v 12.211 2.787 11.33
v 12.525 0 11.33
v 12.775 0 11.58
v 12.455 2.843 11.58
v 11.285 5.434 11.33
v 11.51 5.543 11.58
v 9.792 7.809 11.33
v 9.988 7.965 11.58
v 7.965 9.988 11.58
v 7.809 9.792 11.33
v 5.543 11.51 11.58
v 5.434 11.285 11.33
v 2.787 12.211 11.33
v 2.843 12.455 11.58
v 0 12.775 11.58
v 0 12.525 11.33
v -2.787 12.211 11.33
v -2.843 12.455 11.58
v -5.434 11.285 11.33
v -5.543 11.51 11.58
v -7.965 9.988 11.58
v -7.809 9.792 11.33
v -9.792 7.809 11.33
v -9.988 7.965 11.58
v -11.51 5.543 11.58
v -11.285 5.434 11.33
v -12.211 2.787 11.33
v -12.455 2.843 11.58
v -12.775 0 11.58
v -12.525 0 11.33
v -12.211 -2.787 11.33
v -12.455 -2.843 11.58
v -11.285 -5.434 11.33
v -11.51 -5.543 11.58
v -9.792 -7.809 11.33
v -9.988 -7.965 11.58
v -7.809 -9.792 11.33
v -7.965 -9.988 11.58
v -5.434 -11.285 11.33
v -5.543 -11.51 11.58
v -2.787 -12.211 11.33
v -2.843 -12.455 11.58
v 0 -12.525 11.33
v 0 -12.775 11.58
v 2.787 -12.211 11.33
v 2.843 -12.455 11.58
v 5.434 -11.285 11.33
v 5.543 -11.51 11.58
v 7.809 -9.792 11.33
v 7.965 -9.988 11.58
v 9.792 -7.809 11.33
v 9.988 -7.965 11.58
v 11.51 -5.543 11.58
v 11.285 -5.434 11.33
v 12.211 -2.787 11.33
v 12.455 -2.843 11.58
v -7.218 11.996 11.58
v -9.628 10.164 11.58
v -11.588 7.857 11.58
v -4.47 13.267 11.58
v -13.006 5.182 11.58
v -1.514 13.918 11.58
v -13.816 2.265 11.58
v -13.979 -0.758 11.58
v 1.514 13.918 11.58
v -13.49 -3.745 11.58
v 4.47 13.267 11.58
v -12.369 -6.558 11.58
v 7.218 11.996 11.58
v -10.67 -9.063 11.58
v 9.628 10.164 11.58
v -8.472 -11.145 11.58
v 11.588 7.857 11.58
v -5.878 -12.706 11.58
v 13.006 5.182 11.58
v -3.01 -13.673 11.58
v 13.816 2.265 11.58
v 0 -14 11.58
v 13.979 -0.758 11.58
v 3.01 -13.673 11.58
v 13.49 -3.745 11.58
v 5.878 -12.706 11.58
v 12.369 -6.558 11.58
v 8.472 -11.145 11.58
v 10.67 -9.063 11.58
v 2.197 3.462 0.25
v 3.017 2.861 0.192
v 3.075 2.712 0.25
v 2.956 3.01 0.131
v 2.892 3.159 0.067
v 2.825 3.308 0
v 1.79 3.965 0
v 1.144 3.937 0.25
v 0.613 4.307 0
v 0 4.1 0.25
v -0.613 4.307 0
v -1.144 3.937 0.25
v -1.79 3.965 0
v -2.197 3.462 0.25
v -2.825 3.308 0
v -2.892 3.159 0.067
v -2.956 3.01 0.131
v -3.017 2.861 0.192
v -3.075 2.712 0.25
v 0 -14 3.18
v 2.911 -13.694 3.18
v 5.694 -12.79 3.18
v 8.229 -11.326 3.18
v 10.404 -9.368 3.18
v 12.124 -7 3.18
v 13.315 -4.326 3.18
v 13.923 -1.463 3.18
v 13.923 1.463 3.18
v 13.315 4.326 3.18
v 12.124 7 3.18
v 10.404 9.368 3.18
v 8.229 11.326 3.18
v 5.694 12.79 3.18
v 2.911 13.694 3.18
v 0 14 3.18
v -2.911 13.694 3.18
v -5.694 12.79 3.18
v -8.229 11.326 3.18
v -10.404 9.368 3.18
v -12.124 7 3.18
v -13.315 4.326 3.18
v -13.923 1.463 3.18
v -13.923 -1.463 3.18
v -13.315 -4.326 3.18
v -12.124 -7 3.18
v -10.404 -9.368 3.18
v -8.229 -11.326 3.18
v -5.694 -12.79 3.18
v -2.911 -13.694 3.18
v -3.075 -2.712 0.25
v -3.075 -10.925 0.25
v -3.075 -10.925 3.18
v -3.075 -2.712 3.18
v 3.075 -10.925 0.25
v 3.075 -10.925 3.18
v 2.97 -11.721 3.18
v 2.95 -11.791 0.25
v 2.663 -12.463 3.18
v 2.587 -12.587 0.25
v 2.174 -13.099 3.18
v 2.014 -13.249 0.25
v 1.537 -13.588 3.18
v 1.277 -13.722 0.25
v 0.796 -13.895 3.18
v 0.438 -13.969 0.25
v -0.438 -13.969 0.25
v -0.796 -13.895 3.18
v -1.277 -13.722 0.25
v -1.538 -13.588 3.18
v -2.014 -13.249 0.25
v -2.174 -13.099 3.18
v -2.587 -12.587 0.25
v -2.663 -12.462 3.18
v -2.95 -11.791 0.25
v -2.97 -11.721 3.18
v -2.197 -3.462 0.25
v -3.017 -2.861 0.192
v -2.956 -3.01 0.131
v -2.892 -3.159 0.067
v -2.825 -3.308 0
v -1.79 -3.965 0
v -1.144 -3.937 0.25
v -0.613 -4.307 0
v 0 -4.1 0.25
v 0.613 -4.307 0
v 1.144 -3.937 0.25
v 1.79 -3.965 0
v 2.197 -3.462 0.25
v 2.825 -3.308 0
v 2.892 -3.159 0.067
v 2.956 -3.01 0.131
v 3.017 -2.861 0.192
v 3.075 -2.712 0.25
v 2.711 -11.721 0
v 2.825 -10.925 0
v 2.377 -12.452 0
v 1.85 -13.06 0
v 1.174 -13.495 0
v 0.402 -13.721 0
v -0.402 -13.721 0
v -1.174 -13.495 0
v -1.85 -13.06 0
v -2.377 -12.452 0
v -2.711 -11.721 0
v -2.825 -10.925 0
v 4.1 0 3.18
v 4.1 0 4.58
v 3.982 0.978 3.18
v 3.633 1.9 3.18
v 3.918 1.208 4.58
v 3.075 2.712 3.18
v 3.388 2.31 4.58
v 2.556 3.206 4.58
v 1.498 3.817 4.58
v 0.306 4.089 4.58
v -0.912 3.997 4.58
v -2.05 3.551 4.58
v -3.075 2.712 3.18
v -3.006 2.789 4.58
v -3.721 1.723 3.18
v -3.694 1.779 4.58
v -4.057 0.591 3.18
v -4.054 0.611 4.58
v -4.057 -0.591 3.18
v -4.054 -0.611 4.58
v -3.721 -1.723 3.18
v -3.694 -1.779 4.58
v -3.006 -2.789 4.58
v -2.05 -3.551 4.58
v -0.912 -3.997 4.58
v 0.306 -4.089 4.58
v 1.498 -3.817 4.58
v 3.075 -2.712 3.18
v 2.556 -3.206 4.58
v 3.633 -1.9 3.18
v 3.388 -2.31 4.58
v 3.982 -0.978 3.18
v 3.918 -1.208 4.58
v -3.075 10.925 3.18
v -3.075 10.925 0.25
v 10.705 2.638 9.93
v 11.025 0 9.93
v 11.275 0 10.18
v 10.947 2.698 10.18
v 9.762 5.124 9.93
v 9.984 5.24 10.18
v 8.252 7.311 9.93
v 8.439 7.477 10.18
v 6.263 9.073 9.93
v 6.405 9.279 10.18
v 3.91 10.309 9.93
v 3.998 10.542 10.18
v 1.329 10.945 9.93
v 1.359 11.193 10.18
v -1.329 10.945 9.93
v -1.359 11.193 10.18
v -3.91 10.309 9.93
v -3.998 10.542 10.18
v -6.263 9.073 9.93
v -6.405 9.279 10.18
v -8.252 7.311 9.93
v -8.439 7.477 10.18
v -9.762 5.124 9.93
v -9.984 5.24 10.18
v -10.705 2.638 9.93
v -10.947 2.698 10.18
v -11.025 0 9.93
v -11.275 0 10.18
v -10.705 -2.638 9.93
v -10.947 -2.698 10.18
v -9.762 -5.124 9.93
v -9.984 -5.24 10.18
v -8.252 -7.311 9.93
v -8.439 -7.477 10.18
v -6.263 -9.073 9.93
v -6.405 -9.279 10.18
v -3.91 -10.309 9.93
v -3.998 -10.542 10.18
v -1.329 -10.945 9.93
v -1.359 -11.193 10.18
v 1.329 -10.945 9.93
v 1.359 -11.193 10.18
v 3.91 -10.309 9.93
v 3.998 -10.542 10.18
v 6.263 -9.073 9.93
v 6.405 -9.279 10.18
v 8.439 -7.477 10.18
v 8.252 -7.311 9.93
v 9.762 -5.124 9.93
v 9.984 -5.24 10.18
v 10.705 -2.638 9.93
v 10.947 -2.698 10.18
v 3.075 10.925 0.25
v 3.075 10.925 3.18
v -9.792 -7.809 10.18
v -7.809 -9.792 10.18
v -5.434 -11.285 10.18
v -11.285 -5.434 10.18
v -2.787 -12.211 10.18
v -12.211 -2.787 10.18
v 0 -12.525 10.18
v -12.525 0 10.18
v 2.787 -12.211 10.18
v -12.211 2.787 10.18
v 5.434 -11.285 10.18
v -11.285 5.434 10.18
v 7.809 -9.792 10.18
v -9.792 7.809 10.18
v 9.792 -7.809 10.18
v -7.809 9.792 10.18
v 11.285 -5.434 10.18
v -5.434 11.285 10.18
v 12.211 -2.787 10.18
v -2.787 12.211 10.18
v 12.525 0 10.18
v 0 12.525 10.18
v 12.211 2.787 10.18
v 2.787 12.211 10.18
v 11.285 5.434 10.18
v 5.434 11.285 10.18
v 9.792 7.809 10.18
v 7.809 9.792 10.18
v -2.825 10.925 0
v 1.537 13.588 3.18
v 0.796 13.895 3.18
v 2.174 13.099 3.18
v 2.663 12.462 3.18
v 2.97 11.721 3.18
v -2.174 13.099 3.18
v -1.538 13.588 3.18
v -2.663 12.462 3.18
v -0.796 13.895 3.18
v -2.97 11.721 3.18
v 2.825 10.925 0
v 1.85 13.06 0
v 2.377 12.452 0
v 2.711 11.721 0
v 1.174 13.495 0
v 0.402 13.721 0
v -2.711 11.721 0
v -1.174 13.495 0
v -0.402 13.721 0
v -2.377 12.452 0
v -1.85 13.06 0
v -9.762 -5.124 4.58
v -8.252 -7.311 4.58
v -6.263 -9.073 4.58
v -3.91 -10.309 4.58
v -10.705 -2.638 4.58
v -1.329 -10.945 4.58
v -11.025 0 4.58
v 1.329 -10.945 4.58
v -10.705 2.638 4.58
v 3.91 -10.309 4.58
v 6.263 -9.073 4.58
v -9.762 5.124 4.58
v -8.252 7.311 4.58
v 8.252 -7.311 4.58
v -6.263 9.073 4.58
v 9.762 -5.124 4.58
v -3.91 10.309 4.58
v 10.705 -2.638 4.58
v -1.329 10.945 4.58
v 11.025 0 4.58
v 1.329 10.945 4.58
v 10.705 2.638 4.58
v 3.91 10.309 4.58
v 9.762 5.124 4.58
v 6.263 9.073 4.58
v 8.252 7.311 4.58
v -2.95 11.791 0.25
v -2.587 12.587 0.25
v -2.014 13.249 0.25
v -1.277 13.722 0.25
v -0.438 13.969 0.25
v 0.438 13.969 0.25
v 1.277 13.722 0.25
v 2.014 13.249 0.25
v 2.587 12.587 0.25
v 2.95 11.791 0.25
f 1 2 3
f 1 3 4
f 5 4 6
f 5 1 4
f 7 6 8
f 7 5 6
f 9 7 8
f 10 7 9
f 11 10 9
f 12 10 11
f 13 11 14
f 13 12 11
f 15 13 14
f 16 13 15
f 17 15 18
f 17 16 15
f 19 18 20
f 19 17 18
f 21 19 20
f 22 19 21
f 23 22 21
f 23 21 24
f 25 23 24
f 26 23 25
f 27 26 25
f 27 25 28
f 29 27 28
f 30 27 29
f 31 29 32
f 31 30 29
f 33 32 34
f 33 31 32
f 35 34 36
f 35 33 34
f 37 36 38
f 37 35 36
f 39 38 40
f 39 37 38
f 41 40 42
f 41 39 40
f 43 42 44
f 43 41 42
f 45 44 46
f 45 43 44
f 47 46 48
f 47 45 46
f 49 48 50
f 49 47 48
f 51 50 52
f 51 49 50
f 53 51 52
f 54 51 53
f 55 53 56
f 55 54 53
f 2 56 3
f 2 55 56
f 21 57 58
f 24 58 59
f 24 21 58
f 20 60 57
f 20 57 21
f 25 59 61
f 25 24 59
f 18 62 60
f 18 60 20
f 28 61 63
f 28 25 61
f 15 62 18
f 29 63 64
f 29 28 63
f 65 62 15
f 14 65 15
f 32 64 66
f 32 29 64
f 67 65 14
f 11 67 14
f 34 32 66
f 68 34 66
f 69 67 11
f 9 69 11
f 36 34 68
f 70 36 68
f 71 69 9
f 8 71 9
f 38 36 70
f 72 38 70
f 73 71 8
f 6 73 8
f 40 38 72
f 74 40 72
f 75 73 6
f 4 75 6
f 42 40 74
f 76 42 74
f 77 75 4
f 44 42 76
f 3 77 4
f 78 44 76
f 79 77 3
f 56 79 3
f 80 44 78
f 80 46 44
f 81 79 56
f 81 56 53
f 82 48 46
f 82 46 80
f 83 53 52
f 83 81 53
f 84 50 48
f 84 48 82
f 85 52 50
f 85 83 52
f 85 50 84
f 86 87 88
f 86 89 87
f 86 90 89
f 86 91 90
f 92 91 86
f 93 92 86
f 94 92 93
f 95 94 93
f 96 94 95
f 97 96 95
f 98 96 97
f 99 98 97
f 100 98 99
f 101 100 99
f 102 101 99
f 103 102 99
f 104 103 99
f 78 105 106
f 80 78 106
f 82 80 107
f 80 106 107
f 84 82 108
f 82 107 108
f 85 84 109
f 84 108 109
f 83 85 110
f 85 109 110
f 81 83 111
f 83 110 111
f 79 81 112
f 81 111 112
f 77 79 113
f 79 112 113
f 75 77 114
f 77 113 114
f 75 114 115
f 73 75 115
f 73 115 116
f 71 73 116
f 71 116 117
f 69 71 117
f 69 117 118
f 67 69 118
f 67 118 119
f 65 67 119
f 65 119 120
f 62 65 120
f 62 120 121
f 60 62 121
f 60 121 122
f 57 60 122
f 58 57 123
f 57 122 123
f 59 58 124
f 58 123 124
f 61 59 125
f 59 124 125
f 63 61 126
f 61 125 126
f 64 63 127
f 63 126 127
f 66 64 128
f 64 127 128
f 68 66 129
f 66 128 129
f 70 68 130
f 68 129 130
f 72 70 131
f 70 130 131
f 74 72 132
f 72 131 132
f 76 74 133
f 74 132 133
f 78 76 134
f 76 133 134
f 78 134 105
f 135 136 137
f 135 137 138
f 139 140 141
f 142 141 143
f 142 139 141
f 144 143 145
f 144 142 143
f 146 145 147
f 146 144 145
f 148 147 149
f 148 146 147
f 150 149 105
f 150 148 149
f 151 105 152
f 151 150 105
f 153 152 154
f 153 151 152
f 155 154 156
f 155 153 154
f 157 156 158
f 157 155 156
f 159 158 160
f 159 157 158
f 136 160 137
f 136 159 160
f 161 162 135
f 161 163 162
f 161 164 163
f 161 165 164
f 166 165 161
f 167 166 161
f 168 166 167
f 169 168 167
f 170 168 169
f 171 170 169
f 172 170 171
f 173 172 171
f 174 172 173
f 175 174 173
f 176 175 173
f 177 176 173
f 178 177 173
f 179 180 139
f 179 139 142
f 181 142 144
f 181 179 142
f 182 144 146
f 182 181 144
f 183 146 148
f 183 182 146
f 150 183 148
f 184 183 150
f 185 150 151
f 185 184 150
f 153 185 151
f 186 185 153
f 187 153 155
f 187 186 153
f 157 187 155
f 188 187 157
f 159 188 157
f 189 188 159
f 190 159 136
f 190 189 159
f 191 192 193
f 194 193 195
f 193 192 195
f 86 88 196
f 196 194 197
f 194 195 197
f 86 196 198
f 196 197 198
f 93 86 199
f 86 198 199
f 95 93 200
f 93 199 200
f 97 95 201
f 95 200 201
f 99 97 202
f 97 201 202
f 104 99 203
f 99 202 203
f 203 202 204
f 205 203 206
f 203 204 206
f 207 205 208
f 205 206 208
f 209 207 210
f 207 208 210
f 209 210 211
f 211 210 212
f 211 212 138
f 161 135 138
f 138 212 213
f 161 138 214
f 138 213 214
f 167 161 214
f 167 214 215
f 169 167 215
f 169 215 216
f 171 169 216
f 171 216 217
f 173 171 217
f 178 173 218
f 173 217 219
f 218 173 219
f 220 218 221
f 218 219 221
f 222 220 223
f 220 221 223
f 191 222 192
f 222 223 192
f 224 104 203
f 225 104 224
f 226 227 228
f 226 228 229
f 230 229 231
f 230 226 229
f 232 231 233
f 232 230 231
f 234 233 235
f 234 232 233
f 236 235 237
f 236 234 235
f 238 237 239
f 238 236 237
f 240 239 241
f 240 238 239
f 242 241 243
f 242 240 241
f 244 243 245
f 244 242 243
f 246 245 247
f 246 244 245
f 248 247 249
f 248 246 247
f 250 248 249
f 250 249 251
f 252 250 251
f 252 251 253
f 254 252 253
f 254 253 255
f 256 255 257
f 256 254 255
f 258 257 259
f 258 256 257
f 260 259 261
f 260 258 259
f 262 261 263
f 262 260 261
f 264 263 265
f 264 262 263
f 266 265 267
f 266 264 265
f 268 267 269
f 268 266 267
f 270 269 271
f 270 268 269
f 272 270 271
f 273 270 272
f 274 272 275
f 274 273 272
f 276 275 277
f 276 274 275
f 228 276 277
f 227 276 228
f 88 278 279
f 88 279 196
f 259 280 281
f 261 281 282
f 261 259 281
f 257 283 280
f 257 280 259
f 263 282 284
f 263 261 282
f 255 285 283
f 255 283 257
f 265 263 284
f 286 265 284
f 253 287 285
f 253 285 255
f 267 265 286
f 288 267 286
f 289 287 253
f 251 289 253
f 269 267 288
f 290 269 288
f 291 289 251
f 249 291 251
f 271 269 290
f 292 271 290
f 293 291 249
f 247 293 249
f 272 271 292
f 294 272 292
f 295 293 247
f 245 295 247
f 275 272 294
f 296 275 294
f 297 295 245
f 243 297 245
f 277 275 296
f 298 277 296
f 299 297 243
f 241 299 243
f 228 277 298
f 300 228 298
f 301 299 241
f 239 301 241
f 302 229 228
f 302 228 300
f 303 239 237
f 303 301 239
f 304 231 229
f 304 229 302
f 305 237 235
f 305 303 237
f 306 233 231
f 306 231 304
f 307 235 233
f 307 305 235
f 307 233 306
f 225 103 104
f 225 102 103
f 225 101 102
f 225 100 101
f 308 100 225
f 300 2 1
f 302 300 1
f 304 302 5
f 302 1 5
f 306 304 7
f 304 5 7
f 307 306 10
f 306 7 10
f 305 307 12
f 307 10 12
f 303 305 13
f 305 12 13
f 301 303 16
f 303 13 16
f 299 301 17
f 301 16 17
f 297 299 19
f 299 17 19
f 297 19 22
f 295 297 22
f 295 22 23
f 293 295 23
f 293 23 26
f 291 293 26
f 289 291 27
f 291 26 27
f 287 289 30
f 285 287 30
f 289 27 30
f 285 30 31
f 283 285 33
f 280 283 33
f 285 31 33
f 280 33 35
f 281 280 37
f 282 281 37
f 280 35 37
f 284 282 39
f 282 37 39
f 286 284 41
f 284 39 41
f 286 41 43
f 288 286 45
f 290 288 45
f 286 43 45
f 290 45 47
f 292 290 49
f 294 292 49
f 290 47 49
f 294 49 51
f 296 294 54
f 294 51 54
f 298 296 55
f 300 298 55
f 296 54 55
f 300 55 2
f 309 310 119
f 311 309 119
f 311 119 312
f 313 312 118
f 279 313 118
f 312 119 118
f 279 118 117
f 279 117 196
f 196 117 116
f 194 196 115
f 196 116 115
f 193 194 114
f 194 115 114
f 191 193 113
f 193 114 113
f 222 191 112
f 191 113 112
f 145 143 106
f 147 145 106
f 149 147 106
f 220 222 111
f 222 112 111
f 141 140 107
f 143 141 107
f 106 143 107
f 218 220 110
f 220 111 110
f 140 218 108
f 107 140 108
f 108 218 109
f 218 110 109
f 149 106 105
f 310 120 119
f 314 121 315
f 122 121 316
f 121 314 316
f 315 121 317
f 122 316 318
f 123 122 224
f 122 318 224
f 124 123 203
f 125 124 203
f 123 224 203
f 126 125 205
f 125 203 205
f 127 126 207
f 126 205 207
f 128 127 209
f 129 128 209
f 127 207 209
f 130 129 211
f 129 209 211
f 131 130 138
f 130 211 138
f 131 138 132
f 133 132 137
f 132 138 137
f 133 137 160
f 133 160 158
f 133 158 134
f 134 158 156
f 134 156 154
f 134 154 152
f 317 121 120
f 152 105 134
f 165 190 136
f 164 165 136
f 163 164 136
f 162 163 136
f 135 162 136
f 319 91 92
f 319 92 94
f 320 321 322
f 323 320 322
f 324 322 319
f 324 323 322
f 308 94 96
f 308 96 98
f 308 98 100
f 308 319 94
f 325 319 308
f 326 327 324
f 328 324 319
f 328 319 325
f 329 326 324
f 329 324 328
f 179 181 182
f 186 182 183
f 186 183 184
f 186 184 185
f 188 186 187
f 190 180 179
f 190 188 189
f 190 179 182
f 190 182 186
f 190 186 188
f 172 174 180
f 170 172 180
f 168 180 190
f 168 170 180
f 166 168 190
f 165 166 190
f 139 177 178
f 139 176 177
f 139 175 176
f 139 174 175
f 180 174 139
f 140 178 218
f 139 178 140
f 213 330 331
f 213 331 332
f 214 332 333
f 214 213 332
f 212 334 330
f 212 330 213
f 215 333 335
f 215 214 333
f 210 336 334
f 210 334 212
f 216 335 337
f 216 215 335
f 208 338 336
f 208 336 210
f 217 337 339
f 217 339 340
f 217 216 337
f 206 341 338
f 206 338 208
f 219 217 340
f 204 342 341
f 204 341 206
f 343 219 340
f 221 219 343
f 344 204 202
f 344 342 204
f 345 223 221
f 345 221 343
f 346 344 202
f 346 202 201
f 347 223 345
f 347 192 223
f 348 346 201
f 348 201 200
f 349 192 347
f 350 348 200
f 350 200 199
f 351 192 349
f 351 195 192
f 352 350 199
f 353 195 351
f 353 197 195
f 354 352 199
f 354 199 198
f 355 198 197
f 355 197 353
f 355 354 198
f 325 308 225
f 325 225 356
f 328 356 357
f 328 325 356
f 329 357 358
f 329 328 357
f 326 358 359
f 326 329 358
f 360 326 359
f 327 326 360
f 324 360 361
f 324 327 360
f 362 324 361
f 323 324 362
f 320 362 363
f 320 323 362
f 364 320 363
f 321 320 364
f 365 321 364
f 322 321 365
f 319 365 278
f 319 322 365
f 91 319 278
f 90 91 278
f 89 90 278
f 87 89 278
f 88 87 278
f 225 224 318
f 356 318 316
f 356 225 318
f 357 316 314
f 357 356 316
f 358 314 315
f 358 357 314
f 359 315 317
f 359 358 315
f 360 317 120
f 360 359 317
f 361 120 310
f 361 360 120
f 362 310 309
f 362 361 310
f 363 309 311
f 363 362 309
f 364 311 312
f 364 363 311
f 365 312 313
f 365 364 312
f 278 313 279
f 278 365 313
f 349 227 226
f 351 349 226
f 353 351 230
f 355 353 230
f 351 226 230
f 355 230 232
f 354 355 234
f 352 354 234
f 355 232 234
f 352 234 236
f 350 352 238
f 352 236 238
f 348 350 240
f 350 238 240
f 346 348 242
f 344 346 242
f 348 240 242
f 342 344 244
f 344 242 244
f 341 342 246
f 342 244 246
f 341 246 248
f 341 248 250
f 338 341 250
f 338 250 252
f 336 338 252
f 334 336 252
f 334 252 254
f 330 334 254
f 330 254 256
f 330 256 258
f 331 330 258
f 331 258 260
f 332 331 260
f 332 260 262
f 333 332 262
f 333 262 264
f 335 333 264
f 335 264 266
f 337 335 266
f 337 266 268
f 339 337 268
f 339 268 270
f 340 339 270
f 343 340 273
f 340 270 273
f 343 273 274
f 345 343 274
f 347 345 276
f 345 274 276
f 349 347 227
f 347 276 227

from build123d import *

# Parameters (mm, degrees)
BOSS_EXTRUDE1_DEPTH = 3.18
SKETCH2_R           = 14
BOSS_EXTRUDE2_DEPTH = 8.4
SKETCH3_R           = 4.1
CUT_EXTRUDE1_DEPTH  = 23.936791406
SKETCH4_R           = 11.025
CUT_EXTRUDE2_DEPTH  = 7
SKETCH5_R           = 12.525
CUT_EXTRUDE3_DEPTH  = 1.4
CHAMFER1_SIZE       = 0.25


with BuildPart() as part:
    # Sketch1 → Boss-Extrude1 (new body)
    with BuildSketch(Plane.XY):
        with BuildLine():
            Line((3.075, 10.925), (3.075, -10.925))
            ThreePointArc((3.075, -10.925), (0, -14), (-3.075, -10.925))
            Line((-3.075, -10.925), (-3.075, 10.925))
            ThreePointArc((-3.075, 10.925), (0, 14), (3.075, 10.925))
        make_face()
    extrude(amount=BOSS_EXTRUDE1_DEPTH)

    # Sketch2 → Boss-Extrude2 (add)
    with BuildSketch(Plane.XY.offset(3.18)):
        with Locations(Location((0, 0, 0), (0, 0, 270))):
            Circle(SKETCH2_R)
    extrude(amount=BOSS_EXTRUDE2_DEPTH)

    # Sketch3 → Cut-Extrude1 (cut, through all)
    with BuildSketch(Plane.XY.offset(11.58)):
        Circle(SKETCH3_R)
    extrude(amount=-CUT_EXTRUDE1_DEPTH, mode=Mode.SUBTRACT)

    # Sketch4 → Cut-Extrude2 (cut)
    with BuildSketch(Plane.XY.offset(11.58)):
        Circle(SKETCH4_R)
    extrude(amount=-CUT_EXTRUDE2_DEPTH, mode=Mode.SUBTRACT)

    # Sketch5 → Cut-Extrude3 (cut)
    with BuildSketch(Plane.XY.offset(11.58)):
        Circle(SKETCH5_R)
    extrude(amount=-CUT_EXTRUDE3_DEPTH, mode=Mode.SUBTRACT)

    # Chamfer1
    chamfer1_edges = [part.edges().sort_by_distance(p)[0] for p in [
        (3.075, 6.818447547, 0),
        (-3.075, -6.818447547, 0),
        (0, -4.1, 0),
        (0, 4.1, 0),
        (-12.525, 0, 11.58),
        (-11.025, 0, 10.18),
        (3.075, -6.818447547, 0),
        (0, -14, 0),
        (-3.075, 6.818447547, 0),
        (0, 14, 0),
    ]]
    chamfer(chamfer1_edges, length=CHAMFER1_SIZE)


solid = part.part
